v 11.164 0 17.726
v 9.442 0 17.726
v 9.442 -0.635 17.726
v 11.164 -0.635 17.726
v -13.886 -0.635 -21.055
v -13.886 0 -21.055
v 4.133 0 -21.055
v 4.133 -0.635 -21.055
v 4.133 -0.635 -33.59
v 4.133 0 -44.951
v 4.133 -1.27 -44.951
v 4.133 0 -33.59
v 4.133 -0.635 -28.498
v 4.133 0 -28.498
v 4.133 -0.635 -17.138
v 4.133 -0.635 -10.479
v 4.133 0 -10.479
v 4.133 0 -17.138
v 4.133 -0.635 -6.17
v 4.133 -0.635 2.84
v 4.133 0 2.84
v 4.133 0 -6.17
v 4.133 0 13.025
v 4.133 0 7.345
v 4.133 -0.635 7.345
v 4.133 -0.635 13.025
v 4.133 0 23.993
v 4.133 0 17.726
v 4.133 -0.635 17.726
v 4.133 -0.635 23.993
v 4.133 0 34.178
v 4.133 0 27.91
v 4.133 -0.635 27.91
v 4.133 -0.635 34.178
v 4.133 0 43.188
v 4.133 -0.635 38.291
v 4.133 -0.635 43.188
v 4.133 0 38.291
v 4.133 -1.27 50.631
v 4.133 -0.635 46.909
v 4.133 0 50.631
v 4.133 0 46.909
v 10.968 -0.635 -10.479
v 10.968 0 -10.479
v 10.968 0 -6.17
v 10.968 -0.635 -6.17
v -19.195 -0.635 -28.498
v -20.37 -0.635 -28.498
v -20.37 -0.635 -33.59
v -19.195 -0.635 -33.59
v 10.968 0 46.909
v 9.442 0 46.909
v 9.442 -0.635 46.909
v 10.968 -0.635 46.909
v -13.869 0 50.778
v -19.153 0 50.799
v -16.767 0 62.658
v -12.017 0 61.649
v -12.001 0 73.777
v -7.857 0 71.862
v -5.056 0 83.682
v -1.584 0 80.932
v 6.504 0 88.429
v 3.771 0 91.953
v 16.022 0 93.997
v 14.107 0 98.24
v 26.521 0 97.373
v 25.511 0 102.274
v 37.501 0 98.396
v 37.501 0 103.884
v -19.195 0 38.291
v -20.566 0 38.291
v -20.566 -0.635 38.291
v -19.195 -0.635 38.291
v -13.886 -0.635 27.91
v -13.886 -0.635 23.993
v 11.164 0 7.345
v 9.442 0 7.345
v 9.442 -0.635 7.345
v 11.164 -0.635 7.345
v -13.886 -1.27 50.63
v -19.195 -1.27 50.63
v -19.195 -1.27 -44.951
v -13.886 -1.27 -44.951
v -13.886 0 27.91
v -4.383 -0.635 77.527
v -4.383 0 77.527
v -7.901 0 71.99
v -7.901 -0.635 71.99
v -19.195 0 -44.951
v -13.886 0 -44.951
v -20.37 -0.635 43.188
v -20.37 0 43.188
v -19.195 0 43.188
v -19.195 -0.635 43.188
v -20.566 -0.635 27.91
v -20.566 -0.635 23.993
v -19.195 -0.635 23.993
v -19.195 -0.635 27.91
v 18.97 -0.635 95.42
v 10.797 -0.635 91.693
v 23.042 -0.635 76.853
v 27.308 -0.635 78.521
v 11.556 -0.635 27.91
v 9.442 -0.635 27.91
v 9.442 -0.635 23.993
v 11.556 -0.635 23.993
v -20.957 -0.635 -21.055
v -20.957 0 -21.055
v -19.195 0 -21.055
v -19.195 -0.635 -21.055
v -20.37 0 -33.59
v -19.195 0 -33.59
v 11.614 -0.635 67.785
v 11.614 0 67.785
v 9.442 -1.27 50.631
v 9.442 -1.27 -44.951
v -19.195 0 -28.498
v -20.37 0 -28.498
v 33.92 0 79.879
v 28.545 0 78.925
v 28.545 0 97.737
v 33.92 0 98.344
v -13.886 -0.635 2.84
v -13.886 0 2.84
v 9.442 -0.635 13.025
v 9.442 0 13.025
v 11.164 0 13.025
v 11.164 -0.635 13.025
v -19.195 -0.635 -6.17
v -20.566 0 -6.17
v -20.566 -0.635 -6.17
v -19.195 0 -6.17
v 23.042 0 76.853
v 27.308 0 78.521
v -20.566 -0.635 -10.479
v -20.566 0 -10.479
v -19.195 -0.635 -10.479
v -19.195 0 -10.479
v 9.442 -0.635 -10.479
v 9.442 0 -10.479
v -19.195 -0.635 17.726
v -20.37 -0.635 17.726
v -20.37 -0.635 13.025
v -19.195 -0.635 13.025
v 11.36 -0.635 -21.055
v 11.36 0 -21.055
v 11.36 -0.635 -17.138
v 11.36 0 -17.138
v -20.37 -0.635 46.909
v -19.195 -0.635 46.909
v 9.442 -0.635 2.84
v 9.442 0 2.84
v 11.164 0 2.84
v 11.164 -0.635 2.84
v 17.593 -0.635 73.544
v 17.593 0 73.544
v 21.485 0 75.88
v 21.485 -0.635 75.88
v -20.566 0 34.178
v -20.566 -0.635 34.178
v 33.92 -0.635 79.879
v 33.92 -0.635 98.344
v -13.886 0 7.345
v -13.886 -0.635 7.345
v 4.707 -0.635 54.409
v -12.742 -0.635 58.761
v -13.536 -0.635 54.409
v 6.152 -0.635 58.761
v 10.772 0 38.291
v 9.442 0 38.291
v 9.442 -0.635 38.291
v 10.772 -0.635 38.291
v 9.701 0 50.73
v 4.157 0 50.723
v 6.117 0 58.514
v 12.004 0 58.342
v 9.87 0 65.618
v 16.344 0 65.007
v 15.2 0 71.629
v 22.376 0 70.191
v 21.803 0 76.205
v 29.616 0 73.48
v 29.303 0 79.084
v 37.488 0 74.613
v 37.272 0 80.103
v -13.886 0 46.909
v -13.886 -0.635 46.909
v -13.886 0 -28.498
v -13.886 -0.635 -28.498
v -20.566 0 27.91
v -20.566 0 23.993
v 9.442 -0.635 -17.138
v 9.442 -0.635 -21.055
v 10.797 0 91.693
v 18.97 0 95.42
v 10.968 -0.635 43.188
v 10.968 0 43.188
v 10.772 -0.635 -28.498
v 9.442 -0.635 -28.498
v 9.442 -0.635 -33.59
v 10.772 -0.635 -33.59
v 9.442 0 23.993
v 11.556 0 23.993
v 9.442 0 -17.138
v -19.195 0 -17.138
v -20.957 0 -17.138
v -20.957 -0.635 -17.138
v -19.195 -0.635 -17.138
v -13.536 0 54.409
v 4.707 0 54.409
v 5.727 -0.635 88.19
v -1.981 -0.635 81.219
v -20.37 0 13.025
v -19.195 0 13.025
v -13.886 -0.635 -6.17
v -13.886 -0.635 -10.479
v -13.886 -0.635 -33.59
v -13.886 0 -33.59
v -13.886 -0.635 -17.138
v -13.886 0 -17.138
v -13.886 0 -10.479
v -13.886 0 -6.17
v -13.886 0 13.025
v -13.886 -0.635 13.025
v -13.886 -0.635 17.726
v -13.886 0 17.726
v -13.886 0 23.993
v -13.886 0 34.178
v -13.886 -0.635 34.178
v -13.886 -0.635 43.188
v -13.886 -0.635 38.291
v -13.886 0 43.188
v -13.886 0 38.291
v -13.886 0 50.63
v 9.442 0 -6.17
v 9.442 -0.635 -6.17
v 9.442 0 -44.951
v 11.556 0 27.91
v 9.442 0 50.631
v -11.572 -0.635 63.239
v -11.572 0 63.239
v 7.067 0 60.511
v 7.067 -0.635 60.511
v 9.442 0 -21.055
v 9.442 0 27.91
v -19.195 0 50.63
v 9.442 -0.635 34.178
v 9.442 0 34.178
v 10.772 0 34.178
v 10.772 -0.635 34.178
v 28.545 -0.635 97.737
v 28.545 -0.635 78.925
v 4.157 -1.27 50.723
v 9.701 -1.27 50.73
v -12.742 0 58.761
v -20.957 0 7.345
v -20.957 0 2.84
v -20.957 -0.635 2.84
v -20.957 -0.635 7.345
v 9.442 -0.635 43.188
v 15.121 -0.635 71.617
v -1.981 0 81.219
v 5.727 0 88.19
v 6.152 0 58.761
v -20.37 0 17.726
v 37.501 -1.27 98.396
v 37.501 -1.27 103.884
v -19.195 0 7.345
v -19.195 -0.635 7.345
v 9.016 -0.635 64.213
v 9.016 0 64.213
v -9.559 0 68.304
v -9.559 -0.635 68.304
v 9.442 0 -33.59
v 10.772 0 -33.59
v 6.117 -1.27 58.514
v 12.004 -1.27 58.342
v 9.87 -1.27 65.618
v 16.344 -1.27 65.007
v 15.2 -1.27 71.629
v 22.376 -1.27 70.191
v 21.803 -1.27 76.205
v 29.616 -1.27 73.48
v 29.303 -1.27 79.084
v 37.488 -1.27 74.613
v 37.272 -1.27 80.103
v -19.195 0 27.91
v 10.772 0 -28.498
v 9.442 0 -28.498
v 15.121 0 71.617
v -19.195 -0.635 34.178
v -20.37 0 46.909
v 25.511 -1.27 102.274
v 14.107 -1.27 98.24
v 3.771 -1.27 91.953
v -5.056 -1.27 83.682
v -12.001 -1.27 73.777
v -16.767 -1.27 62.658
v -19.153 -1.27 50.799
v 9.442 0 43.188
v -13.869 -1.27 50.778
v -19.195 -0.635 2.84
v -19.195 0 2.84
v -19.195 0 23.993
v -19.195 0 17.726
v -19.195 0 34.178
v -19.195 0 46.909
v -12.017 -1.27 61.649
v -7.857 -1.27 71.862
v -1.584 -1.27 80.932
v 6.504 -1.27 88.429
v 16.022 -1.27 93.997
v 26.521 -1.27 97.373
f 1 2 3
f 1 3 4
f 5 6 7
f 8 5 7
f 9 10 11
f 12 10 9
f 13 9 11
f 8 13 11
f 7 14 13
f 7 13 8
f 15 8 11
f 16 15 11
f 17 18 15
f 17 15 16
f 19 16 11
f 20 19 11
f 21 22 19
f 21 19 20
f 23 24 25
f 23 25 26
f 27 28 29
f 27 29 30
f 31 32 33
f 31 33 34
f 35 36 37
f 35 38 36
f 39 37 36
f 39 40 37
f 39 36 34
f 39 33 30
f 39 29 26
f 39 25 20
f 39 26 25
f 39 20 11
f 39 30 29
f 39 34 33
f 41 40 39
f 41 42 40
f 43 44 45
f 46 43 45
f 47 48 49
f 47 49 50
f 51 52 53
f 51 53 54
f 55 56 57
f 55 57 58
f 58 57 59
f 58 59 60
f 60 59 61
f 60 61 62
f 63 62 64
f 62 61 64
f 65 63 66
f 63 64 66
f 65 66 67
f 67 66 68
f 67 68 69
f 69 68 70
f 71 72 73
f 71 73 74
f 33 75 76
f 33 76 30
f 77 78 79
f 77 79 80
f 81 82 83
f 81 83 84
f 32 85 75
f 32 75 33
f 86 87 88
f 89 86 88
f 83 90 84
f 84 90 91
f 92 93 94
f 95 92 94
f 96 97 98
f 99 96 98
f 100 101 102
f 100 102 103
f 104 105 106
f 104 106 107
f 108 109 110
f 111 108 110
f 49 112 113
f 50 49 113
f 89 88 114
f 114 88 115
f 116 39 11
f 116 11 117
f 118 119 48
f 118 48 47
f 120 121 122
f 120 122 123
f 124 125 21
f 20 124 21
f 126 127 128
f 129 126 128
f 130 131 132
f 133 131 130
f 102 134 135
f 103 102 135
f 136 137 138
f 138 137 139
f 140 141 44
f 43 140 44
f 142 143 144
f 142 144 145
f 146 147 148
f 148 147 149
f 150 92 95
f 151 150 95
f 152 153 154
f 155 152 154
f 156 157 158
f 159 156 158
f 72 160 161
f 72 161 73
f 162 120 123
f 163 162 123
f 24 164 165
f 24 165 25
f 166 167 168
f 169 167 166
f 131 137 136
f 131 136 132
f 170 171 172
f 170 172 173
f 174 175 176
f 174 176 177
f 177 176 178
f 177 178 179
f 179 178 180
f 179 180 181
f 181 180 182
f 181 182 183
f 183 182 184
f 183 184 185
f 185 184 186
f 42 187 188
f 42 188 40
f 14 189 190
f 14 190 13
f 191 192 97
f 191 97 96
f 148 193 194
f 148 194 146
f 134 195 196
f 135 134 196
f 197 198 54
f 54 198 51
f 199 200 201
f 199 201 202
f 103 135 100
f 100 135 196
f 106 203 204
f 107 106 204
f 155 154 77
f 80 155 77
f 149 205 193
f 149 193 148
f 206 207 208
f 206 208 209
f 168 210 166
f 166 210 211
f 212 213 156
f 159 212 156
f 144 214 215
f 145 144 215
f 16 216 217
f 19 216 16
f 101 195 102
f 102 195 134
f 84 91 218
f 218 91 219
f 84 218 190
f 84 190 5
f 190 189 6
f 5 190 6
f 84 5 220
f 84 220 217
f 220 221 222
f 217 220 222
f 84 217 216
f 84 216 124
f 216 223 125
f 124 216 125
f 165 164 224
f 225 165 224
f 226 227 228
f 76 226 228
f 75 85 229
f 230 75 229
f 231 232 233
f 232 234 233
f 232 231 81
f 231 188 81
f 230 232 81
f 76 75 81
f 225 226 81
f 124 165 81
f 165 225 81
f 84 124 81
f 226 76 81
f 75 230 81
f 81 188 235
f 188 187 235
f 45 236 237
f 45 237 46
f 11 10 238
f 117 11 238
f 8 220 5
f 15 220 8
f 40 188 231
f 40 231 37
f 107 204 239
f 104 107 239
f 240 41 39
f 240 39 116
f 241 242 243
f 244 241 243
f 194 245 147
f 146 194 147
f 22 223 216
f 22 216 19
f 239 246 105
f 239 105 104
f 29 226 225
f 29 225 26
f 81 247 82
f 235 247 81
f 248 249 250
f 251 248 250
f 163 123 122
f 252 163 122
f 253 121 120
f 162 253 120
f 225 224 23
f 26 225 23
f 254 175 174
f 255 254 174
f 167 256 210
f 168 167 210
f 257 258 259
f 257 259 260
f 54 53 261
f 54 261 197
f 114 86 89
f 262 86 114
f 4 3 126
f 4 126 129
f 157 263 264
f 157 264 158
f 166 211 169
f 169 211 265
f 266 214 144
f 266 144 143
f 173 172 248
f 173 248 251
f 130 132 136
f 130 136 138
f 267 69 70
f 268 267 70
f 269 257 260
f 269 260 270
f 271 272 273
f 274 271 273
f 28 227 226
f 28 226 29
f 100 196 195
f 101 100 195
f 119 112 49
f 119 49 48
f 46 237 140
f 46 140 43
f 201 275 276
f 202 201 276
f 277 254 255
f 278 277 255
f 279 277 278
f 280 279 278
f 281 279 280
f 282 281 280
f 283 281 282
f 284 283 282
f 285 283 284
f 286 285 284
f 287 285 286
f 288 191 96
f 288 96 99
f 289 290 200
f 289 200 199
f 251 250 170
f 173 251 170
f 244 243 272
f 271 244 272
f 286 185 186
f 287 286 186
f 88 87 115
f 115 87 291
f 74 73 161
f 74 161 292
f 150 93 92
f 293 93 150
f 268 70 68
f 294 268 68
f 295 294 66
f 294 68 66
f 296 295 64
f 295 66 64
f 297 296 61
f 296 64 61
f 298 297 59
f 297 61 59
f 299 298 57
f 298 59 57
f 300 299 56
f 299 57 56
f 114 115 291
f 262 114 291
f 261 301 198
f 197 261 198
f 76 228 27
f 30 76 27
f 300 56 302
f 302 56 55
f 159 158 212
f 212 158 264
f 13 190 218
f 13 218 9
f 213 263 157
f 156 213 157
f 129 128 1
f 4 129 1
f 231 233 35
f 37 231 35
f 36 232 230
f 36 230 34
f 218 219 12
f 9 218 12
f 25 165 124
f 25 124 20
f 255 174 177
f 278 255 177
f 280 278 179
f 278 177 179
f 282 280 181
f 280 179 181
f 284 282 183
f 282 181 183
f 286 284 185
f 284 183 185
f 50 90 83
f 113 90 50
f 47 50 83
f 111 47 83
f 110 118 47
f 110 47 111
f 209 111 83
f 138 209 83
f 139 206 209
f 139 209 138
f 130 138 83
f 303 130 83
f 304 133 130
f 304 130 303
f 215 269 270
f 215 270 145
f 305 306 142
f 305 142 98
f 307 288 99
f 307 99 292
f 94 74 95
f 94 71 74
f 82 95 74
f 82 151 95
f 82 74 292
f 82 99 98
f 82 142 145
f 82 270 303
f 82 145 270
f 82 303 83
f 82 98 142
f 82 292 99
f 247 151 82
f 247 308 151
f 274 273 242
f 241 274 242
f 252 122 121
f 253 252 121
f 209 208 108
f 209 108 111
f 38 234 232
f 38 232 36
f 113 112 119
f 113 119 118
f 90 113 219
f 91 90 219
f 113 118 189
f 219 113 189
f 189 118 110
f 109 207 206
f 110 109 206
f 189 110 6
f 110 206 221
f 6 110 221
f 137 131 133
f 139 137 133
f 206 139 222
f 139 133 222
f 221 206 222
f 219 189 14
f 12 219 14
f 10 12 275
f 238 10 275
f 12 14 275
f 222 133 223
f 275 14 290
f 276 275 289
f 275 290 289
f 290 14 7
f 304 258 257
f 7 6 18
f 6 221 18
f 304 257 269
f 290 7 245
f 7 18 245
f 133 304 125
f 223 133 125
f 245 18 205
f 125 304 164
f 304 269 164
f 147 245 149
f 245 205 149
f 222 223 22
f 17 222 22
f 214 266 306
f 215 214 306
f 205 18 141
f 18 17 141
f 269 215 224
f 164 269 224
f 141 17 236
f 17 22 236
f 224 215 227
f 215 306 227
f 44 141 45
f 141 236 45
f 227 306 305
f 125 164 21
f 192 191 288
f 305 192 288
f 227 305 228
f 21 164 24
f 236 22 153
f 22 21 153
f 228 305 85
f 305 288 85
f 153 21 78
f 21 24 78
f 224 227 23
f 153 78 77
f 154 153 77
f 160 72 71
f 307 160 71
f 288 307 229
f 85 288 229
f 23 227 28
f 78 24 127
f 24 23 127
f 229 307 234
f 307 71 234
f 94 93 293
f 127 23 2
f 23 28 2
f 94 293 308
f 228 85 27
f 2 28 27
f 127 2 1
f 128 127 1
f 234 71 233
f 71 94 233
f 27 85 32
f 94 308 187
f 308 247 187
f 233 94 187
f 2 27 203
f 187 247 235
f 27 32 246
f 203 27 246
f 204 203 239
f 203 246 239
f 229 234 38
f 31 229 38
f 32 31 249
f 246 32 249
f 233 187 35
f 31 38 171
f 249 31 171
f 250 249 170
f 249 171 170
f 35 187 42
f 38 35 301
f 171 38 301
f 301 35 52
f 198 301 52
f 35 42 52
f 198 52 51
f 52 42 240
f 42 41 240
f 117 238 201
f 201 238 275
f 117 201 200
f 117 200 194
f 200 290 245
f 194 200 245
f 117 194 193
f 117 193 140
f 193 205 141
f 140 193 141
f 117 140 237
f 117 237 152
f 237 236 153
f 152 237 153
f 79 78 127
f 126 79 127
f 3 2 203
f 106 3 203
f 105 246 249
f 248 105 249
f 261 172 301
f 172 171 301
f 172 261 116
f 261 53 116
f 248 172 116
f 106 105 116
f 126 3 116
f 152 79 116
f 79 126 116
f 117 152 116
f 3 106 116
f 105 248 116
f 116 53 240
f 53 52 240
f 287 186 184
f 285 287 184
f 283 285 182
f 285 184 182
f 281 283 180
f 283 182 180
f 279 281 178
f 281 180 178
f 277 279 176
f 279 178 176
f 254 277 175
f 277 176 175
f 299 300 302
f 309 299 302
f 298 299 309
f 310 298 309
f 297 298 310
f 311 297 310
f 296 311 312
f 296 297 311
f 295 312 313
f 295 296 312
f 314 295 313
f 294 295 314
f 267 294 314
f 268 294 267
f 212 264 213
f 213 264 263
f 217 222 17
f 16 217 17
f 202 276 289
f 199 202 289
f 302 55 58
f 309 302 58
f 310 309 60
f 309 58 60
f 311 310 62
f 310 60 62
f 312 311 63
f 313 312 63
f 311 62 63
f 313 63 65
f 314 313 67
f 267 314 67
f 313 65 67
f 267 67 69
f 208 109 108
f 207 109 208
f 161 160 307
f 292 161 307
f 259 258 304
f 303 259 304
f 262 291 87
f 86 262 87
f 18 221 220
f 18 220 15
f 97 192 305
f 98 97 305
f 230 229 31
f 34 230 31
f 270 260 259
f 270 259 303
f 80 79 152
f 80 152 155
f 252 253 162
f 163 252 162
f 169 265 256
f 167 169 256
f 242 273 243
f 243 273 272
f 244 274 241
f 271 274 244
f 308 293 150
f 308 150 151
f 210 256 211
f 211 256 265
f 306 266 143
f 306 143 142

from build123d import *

# Parameters (mm, degrees)
F0_W     = 5.3086
F0_H     = 95.581103
F0_H_2   = 95.5802
F1_DEPTH = 1.27
F2_W     = 31.338068
F2_H     = 4.113121
F2_W_2   = 32.121519
F2_H_2   = 3.917256
F2_W_3   = 31.533929
F2_H_3   = 4.70071
F2_H_4   = 4.504847
F2_W_4   = 31.53393
F2_H_5   = 4.308983
F2_W_5   = 32.31738
F2_H_6   = 3.917258
F2_W_6   = 31.142203
F2_H_7   = 5.092438
F2_W_7   = 31.338067
F2_H_8   = 3.721397
F3_DEPTH = 0.635
F7_DEPTH = 1.27
F8_DEPTH = 0.635


with BuildPart() as f1:
    # F0 (on Front) → F1 (new body)
    with BuildSketch(Plane.XZ):
        with Locations((6.787726, 2.840014)):
            Rectangle(F0_W, F0_H)
        with Locations((-16.540268, 2.839563)):
            Rectangle(F0_W, F0_H_2)
    extrude(amount=F1_DEPTH)

    # F2 (on Front) → F3 (join)
    with BuildSketch(Plane.XZ):
        with Locations((-4.896573, 36.23464)):
            Rectangle(F2_W, F2_H)
        with Locations((-4.504848, 25.951837)):
            Rectangle(F2_W_2, F2_H_2)
        with Locations((-4.602777, 15.375239)):
            Rectangle(F2_W_3, F2_H_3)
        with Locations((-4.896572, 5.092435)):
            Rectangle(F2_W_2, F2_H_4)
        with Locations((-4.798642, -8.324174)):
            Rectangle(F2_W_4, F2_H_5)
        with Locations((-4.798642, -19.096635)):
            Rectangle(F2_W_5, F2_H_6)
        with Locations((-4.79864, -31.044273)):
            Rectangle(F2_W_6, F2_H_7)
        with Locations((-4.700711, 45.048469)):
            Rectangle(F2_W_7, F2_H_8)
    extrude(amount=F3_DEPTH)


with BuildPart() as f7:
    # F4 (on Front) + F5 (on Front) → F7 (new body)
    with BuildSketch(Plane.XZ):
        with BuildLine():
            ThreePointArc((9.701273, 50.729942), (19.175977, 67.812709), (37.488302, 74.613422))
            Line((37.488302, 74.613422), (37.272278, 80.102906))
            ThreePointArc((37.272278, 80.102906), (15.19967, 71.629303), (4.156627, 50.723485))
            Line((4.156627, 50.723485), (9.701273, 50.729942))
        make_face()
    with BuildSketch(Plane.XZ):
        with BuildLine():
            ThreePointArc((-13.868733, 50.77798), (2.255422, 84.90094), (37.500944, 98.396048))
            Line((37.500944, 98.396048), (37.500944, 103.883989))
            ThreePointArc((37.500944, 103.883989), (-0.856302, 88.045673), (-19.15333, 50.798534))
            Line((-19.15333, 50.798534), (-13.868733, 50.77798))
        make_face()
    extrude(amount=F7_DEPTH)


with BuildPart() as f8:
    # F6 (on Front) → F8 (new body)
    with BuildSketch(Plane.XZ):
        Polygon((-12.741525, 58.760706), (-13.536491, 54.409306), (4.707173, 54.409306), (6.151899, 58.760706), align=None)
        Polygon((33.919547, 79.878546), (33.919547, 98.344117), (28.544594, 97.737268), (28.544594, 78.924924), align=None)
        Polygon((5.727119, 88.190352), (-1.981236, 81.219031), (17.592501, 73.544174), (21.48488, 75.879604), align=None)
        Polygon((18.969956, 95.419877), (10.796764, 91.692897), (23.041829, 76.852694), (27.30779, 78.521498), align=None)
        Polygon((-4.383258, 77.526839), (-7.900867, 71.989861), (11.61355, 67.784742), (15.120646, 71.616568), align=None)
        Polygon((9.0157, 64.212695), (-9.558925, 68.304308), (-11.572259, 63.238502), (7.067312, 60.510758), align=None)
    extrude(amount=F8_DEPTH)


solid = Compound([f1.part, f7.part, f8.part])
